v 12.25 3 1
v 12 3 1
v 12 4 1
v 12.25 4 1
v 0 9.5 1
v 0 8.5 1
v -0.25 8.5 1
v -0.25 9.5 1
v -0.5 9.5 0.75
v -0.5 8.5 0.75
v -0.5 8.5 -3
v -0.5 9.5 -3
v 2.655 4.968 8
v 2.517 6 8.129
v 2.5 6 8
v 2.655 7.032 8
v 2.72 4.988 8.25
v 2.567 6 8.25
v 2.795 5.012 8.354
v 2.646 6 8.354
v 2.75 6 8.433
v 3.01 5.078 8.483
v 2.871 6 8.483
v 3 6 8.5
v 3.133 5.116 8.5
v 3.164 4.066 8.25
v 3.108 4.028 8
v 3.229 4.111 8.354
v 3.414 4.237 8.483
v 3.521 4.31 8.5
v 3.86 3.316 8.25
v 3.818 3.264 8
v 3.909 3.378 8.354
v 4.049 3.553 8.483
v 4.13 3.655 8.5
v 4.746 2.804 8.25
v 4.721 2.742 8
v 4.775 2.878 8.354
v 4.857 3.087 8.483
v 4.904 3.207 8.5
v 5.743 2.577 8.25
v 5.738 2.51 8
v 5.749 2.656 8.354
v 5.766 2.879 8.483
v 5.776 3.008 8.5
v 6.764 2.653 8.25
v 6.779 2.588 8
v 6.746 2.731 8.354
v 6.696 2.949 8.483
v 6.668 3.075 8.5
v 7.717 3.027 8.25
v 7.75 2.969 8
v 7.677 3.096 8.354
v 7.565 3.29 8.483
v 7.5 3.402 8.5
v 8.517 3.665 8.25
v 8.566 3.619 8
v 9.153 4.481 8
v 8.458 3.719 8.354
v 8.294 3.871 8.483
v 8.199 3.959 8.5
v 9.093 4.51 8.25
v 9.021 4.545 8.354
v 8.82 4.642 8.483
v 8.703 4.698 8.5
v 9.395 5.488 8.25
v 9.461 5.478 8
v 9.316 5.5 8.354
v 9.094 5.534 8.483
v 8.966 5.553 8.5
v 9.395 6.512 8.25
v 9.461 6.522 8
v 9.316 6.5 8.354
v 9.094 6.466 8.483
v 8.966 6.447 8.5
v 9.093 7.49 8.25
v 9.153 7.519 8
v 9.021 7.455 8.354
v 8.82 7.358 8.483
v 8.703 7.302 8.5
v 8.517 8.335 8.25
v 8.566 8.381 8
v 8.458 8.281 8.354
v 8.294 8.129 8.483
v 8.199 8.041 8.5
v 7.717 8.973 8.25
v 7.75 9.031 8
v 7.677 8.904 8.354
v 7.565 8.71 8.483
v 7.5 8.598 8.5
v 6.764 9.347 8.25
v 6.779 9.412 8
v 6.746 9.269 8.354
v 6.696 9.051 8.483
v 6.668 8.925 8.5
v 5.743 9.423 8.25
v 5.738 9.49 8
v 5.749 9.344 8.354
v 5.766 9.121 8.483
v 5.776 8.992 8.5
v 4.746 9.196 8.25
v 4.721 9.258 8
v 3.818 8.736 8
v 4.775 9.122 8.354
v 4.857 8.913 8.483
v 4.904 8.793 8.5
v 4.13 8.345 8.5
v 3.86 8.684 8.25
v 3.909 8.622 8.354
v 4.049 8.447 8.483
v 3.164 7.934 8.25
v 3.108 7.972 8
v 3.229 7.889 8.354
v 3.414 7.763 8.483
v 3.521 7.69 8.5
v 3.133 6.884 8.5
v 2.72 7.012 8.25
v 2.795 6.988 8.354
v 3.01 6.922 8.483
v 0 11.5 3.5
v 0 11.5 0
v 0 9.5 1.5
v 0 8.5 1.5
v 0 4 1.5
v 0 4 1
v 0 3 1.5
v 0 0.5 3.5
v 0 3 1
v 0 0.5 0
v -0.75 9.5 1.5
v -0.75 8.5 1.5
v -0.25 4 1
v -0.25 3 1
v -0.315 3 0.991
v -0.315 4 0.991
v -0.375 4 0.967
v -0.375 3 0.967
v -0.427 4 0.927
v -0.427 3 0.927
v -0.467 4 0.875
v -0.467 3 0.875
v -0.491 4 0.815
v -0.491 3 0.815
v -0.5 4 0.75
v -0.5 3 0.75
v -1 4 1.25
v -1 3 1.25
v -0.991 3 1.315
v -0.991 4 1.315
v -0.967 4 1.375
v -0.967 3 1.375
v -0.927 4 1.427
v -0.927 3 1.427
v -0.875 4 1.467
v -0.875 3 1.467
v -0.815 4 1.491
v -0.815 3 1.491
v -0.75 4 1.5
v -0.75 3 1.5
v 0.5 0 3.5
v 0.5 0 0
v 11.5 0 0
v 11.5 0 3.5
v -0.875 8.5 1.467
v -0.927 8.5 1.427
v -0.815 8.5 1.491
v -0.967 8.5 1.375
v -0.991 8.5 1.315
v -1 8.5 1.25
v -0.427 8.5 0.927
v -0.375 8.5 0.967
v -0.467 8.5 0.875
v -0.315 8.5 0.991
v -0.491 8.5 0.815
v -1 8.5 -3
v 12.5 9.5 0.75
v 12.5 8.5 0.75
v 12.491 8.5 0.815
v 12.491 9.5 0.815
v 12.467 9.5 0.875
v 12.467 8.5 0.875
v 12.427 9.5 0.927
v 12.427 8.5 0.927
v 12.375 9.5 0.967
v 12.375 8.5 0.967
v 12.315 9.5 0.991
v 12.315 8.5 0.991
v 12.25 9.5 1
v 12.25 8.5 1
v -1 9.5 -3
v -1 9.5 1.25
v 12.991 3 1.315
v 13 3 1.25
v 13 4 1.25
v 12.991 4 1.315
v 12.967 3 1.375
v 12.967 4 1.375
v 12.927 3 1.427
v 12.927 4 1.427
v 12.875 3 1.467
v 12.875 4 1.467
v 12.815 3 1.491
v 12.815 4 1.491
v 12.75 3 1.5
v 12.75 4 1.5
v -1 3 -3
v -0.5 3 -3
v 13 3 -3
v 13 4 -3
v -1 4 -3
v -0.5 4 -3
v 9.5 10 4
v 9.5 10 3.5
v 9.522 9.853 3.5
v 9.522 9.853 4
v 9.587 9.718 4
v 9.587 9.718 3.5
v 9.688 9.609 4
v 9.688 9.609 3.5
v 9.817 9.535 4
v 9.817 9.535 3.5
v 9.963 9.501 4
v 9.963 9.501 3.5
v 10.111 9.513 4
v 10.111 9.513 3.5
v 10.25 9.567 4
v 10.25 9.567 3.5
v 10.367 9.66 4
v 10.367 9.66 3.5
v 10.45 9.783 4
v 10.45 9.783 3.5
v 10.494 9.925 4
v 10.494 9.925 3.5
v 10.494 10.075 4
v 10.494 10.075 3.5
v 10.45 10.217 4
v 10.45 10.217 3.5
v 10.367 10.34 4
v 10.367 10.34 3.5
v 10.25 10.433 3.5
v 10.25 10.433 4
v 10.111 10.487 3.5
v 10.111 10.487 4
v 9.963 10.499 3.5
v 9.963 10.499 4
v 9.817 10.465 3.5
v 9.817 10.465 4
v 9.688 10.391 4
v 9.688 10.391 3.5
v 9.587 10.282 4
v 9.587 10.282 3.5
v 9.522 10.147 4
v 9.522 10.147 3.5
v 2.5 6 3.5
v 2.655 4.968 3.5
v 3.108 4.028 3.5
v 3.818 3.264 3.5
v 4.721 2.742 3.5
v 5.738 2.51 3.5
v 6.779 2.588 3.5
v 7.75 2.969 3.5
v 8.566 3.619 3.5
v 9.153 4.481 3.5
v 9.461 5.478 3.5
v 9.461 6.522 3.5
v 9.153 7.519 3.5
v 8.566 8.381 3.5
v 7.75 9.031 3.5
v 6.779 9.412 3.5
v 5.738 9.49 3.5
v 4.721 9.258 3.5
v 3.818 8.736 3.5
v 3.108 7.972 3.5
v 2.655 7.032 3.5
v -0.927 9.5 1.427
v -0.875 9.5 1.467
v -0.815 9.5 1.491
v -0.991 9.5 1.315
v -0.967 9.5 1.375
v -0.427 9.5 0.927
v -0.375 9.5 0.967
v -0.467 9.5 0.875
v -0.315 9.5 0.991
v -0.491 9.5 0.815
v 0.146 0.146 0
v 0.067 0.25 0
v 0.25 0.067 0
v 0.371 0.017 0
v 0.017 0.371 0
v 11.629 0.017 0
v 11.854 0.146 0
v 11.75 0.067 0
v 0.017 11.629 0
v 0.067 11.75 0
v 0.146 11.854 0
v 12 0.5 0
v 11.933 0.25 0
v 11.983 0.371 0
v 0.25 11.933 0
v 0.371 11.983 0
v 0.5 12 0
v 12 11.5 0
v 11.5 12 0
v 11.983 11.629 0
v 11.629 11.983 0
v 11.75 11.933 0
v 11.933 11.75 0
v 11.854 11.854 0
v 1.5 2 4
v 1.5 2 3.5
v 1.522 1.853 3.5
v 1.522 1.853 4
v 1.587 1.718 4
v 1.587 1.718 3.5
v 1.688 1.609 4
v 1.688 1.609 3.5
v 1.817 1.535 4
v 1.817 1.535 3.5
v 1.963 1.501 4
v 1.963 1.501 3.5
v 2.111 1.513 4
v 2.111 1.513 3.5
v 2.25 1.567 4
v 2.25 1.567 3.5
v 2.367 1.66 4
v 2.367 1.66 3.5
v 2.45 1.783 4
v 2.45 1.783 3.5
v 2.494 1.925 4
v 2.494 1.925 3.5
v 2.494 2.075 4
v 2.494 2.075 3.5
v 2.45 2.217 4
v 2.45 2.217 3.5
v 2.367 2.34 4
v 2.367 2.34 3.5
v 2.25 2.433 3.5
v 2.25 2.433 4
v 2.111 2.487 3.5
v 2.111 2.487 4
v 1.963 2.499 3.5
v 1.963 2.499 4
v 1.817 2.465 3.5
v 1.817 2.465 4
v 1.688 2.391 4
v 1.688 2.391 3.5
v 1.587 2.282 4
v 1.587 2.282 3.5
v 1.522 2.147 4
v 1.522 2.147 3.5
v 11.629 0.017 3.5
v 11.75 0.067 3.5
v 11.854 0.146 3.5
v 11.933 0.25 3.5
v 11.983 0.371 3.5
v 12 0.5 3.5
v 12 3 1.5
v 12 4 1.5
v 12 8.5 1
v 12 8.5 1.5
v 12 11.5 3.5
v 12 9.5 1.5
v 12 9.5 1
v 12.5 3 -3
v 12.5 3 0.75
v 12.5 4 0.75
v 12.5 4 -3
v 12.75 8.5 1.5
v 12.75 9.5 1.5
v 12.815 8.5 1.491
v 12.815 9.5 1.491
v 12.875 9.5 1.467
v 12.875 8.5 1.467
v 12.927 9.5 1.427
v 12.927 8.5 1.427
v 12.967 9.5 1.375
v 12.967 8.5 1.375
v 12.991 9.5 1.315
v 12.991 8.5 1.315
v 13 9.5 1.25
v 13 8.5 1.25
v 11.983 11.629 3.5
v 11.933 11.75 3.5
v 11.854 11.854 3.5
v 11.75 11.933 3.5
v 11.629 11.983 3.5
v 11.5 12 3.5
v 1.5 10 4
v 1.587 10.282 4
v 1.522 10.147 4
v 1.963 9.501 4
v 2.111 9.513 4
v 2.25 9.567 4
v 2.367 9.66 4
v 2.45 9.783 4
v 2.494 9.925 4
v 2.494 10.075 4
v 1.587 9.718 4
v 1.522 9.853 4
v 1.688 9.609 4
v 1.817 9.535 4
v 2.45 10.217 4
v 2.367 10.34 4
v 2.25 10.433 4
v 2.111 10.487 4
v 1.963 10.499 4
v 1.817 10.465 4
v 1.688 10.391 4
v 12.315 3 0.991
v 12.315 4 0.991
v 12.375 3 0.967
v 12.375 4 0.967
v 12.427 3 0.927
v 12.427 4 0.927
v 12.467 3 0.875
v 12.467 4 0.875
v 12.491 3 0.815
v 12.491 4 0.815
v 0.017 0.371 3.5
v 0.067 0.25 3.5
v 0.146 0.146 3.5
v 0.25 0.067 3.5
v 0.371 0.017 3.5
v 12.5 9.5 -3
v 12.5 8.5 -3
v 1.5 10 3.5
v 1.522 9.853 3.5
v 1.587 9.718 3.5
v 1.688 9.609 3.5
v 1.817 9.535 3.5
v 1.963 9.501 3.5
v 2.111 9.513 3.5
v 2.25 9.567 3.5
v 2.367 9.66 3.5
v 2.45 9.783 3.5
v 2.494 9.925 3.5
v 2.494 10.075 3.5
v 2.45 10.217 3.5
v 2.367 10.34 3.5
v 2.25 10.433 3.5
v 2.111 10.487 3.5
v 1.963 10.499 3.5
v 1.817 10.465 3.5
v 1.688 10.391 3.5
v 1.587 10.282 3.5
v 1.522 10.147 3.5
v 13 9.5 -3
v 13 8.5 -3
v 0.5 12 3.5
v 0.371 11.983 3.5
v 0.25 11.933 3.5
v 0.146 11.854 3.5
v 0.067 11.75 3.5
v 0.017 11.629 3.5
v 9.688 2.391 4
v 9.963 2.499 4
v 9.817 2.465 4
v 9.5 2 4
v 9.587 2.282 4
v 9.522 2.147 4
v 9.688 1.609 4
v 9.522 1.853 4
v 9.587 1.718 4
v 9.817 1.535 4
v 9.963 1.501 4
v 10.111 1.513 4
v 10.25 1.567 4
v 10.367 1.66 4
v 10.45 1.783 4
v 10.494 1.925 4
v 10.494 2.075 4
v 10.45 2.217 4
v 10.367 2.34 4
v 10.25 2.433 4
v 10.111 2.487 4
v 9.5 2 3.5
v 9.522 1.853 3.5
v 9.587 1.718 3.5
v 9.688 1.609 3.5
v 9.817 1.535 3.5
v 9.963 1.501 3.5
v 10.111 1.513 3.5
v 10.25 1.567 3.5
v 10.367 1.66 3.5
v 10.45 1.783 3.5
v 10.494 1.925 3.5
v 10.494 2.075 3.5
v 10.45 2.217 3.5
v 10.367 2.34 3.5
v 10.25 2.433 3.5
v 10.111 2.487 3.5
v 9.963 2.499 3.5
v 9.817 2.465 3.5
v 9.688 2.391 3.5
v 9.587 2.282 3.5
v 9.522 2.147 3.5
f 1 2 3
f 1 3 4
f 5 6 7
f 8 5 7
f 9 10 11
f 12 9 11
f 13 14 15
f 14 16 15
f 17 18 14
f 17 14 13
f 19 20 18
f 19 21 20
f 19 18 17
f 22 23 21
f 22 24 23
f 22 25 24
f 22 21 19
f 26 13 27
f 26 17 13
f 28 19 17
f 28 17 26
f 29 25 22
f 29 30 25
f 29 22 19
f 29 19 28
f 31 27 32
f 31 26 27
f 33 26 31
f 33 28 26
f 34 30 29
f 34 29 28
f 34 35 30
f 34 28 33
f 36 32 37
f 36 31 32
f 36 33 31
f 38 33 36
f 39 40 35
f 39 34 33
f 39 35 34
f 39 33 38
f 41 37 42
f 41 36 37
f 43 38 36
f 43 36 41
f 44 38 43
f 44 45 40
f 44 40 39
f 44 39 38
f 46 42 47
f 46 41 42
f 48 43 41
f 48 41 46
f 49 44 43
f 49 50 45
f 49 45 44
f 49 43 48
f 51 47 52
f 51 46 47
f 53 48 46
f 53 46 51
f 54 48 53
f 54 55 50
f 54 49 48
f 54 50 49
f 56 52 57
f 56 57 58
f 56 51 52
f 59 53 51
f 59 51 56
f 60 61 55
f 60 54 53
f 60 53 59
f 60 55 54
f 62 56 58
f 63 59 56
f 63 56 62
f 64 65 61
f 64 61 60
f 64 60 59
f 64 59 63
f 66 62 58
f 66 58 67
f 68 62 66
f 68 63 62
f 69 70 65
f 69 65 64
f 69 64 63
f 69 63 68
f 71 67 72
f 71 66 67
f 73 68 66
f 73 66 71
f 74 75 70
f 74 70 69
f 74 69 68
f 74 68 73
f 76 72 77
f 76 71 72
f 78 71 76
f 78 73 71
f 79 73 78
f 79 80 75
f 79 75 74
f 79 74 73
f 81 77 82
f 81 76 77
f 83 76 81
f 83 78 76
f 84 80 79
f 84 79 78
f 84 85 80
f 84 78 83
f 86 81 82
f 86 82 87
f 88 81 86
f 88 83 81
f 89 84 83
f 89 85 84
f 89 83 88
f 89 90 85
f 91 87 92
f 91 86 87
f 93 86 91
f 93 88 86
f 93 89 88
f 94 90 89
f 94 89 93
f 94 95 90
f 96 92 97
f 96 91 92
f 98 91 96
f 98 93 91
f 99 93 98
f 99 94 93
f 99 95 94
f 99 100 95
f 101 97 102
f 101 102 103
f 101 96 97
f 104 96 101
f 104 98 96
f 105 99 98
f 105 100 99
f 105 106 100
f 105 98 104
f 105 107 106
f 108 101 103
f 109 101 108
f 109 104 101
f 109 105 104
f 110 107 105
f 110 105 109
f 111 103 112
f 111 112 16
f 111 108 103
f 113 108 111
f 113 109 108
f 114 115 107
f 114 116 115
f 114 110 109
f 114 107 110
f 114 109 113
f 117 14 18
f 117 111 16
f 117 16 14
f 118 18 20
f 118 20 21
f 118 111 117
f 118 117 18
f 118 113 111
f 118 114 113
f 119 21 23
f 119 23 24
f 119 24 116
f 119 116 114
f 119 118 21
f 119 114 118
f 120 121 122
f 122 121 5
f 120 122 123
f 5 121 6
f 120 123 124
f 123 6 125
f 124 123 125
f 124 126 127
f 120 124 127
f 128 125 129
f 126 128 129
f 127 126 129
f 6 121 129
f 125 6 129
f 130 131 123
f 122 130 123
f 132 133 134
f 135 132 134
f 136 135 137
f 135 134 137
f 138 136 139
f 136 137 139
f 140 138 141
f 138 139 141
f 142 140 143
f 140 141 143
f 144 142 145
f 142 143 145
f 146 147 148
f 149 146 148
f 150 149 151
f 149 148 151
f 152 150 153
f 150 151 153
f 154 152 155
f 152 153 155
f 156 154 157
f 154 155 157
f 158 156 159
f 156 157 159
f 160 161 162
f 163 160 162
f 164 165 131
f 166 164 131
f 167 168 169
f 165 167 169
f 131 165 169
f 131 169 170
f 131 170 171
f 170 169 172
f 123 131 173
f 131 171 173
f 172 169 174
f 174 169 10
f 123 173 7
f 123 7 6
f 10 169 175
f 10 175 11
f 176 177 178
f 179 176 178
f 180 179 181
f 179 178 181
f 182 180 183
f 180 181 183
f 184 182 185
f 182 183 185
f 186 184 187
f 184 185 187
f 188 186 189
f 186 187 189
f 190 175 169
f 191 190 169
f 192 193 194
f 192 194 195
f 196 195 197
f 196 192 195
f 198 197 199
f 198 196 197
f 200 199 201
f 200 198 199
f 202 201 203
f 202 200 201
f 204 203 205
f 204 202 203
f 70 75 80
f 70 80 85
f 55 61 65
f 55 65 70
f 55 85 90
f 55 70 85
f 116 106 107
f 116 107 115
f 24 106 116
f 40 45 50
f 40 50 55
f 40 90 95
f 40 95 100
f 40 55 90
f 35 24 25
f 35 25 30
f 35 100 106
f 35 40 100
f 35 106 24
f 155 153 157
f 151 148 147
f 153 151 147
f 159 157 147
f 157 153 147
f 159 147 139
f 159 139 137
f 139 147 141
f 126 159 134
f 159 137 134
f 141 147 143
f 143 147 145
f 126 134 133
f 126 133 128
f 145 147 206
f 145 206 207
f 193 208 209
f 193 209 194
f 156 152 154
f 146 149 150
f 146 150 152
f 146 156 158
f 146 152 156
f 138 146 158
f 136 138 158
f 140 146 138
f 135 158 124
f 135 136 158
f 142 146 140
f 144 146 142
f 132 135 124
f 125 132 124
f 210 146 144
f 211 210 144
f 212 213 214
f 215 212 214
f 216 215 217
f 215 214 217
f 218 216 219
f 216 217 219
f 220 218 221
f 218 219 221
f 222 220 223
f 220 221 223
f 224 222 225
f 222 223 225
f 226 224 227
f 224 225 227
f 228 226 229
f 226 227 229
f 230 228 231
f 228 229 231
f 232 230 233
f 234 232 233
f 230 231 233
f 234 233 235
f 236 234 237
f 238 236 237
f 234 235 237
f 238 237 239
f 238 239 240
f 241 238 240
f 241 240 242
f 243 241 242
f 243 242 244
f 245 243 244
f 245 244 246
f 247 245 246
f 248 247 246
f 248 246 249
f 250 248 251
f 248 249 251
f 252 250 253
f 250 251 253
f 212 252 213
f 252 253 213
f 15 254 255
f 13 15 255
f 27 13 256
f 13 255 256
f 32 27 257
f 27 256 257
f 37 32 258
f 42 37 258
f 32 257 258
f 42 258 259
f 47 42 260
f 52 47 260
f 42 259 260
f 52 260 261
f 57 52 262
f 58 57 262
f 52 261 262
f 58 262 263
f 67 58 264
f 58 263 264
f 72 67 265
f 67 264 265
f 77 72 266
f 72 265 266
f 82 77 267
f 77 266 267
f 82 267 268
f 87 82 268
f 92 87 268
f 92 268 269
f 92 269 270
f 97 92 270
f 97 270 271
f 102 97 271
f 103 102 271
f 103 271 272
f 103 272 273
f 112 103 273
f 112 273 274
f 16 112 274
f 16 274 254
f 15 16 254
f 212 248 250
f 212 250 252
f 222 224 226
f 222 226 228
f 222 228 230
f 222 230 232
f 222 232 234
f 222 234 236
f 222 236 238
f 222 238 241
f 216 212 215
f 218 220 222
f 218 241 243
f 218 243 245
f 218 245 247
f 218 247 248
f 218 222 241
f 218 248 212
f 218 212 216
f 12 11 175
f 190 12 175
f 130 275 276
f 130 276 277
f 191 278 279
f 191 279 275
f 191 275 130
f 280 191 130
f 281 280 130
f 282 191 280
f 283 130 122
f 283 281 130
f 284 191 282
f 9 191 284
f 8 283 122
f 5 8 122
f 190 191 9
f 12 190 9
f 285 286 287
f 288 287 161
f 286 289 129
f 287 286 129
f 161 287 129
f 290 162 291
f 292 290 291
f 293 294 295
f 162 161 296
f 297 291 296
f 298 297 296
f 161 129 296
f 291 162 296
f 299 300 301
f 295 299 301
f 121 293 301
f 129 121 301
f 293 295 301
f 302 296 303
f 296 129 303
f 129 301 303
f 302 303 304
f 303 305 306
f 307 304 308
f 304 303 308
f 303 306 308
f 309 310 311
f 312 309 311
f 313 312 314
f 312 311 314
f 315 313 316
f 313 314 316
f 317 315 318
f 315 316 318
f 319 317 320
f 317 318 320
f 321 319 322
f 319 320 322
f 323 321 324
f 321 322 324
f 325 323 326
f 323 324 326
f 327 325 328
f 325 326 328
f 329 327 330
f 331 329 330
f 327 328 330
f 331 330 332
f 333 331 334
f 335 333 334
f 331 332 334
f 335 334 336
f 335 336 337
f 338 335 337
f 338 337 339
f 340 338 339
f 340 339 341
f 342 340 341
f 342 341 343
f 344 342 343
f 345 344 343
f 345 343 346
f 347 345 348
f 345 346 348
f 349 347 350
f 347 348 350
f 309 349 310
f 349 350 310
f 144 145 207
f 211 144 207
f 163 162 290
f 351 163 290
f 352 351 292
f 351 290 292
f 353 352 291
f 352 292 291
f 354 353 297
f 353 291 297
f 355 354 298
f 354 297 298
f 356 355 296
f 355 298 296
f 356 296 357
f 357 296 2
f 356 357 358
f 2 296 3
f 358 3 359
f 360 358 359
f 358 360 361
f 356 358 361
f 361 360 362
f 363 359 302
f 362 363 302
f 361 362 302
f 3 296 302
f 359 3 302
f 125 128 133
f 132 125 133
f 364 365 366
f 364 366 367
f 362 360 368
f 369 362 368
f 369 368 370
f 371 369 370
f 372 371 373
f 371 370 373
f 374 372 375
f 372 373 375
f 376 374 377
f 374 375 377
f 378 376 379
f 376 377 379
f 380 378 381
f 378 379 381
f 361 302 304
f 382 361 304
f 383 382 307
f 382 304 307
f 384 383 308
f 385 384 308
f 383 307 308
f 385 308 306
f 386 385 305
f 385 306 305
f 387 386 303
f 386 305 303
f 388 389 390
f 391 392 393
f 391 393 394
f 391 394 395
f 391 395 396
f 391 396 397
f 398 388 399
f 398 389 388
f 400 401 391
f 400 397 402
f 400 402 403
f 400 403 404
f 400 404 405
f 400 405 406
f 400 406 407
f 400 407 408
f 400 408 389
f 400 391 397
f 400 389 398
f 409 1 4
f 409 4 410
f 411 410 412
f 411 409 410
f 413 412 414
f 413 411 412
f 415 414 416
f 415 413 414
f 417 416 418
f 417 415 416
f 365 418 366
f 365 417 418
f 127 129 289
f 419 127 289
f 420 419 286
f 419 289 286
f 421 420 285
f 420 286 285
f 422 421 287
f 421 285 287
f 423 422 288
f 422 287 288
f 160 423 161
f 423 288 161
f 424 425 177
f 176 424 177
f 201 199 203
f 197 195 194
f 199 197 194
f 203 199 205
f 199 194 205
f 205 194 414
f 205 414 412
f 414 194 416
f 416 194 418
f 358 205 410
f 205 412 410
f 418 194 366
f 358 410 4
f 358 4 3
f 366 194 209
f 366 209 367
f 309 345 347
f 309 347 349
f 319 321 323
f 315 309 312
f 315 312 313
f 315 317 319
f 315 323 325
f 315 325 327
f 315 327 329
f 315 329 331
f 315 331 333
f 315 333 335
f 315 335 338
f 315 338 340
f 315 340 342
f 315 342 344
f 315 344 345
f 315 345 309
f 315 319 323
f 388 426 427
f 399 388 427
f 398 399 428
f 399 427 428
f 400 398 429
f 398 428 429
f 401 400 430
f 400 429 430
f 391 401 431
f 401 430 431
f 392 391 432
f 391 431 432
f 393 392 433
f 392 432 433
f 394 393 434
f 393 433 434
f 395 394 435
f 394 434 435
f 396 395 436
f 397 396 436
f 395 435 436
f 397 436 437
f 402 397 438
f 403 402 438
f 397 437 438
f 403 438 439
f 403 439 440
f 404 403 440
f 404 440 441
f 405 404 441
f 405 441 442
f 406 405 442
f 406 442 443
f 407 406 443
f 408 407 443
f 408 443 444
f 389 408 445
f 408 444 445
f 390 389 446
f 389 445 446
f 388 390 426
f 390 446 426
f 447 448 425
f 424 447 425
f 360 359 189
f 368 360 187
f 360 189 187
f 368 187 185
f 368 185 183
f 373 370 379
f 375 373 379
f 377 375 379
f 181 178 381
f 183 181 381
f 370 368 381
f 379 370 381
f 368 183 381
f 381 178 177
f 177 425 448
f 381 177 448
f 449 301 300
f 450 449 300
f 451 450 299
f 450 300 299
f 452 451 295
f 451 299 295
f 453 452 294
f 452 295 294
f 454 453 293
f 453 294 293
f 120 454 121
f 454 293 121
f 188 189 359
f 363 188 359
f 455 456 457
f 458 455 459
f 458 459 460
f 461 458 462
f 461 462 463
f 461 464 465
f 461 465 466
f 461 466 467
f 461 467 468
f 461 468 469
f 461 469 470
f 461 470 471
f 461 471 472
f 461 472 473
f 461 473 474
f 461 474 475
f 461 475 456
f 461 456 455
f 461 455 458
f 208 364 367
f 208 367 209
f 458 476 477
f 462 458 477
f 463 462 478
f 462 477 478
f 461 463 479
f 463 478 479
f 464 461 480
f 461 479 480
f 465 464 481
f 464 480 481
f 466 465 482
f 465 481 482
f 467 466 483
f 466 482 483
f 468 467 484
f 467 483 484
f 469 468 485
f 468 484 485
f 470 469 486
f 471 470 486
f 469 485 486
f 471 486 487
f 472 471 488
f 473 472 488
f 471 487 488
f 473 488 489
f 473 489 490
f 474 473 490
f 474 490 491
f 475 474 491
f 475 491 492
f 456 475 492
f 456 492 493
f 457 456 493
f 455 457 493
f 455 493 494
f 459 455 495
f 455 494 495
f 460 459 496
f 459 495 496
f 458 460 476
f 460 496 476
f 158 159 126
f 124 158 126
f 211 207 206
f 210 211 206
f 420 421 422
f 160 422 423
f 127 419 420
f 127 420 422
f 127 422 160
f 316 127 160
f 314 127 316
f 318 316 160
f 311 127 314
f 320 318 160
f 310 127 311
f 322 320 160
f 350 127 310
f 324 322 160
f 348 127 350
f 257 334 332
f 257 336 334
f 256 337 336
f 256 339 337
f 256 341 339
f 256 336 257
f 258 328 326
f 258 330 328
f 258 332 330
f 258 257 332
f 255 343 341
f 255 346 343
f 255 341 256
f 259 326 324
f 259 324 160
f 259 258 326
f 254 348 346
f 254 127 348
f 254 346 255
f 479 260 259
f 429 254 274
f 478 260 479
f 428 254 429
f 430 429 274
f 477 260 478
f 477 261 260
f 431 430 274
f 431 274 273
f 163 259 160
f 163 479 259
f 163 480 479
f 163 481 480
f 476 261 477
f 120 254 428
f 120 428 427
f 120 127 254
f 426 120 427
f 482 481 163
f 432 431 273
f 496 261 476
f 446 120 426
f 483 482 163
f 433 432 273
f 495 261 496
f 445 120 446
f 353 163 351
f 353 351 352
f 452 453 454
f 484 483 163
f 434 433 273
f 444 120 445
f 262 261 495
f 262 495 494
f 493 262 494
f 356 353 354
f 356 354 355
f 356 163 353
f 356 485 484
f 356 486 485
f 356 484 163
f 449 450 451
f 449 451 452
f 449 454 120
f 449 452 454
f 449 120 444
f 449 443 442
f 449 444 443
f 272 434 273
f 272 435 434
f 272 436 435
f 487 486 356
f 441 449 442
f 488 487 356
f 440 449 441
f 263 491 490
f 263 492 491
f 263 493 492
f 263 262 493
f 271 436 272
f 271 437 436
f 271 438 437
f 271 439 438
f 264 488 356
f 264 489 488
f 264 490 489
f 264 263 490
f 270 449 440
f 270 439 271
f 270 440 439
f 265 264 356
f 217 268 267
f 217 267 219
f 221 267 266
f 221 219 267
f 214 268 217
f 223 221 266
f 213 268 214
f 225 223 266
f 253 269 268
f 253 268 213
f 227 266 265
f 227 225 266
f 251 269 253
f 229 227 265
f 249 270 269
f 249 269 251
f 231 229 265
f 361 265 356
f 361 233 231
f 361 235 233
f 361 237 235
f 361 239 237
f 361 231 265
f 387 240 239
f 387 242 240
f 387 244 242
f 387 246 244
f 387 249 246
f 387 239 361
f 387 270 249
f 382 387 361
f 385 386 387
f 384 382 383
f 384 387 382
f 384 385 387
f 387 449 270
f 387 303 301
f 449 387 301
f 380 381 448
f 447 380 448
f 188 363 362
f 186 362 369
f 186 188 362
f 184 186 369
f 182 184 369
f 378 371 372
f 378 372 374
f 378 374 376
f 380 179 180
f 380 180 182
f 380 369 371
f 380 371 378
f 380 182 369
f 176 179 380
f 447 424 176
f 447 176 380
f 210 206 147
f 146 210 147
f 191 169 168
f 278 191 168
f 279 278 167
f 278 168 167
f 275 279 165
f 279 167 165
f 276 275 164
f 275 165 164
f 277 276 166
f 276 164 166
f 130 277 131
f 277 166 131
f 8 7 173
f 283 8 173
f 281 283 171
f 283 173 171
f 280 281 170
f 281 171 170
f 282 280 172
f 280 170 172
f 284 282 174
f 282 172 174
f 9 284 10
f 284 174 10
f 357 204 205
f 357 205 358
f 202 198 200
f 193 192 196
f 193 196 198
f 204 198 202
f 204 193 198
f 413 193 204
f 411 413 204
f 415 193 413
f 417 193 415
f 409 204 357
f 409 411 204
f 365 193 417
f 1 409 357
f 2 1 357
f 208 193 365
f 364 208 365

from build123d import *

# Parameters (mm, degrees)
Y_KSEKLIK_EKSTR_ZYON1_DEPTH = 3.5
IZIM2_R                     = 3.5
IZIM2_R_2                   = 0.5
Y_KSEKLIK_EKSTR_ZYON2_DEPTH = 0.5
IZIM3_R                     = 3.5
Y_KSEKLIK_EKSTR_ZYON3_DEPTH = 4.5
Y_KSEKLIK_EKSTR_ZYON4_DEPTH = 1
Y_KSEKLIK_EKSTR_ZYON5_DEPTH = 1
RADYUS1_R                   = 0.5


with BuildPart() as part:
    # Çizim1 → Yükseklik-Ekstrüzyon1 (new body)
    with BuildSketch(Plane.XY):
        with BuildLine():
            Line((0.5, 0), (11.5, 0))
            ThreePointArc((11.5, 0), (11.853553391, 0.146446609), (12, 0.5))
            Line((12, 0.5), (12, 11.5))
            ThreePointArc((12, 11.5), (11.853553391, 11.853553391), (11.5, 12))
            Line((11.5, 12), (0.5, 12))
            ThreePointArc((0.5, 12), (0.146446609, 11.853553391), (0, 11.5))
            Line((0, 11.5), (0, 0.5))
            ThreePointArc((0, 0.5), (0.146446609, 0.146446609), (0.5, 0))
        make_face()
    extrude(amount=Y_KSEKLIK_EKSTR_ZYON1_DEPTH)

    # Çizim2 → Yükseklik-Ekstrüzyon2 (add)
    with BuildSketch(Plane.XY.offset(3.5)):
        with Locations(Location((6, 6, 0), (0, 0, 180))):
            Circle(IZIM2_R)
        with Locations(Location((10, 10, 0), (0, 0, 180))):
            Circle(IZIM2_R_2)
        with Locations(Location((2, 10, 0), (0, 0, 180))):
            Circle(IZIM2_R_2)
        with Locations(Location((2, 2, 0), (0, 0, 180))):
            Circle(IZIM2_R_2)
        with Locations(Location((10, 2, 0), (0, 0, 180))):
            Circle(IZIM2_R_2)
    extrude(amount=Y_KSEKLIK_EKSTR_ZYON2_DEPTH)

    # Çizim3 → Yükseklik-Ekstrüzyon3 (add)
    with BuildSketch(Plane.XY.offset(4)):
        with Locations(Location((6, 6, 0), (0, 0, 180))):
            Circle(IZIM3_R)
    extrude(amount=Y_KSEKLIK_EKSTR_ZYON3_DEPTH)

    # Çizim4 → Yükseklik-Ekstrüzyon4 (add)
    with BuildSketch(Plane(origin=(0, 3, 0), x_dir=(-1, 0, 0), z_dir=(0, -1, 0))):
        with BuildLine():
            Line((0, -1), (0.25, -1))
            ThreePointArc((0.25, -1), (0.426776695, -0.926776695), (0.5, -0.75))
            Line((0.5, -0.75), (0.5, 3))
            Line((0.5, 3), (1, 3))
            Line((1, 3), (1, -1.25))
            ThreePointArc((1, -1.25), (0.926776695, -1.426776695), (0.75, -1.5))
            Line((0.75, -1.5), (0, -1.5))
            Line((0, -1.5), (0, -1))
        make_face()
        with BuildLine():
            Line((-12, -1.5), (-12, -1))
            Line((-12, -1), (-12.25, -1))
            ThreePointArc((-12.25, -1), (-12.426776695, -0.926776695), (-12.5, -0.75))
            Line((-12.5, -0.75), (-12.5, 3))
            Line((-12.5, 3), (-13, 3))
            Line((-13, 3), (-13, -1.25))
            ThreePointArc((-13, -1.25), (-12.926776695, -1.426776695), (-12.75, -1.5))
            Line((-12.75, -1.5), (-12, -1.5))
        make_face()
    extrude(amount=-Y_KSEKLIK_EKSTR_ZYON4_DEPTH)

    # Çizim6 → Yükseklik-Ekstrüzyon5 (add)
    with BuildSketch(Plane(origin=(0, 8.5, 0), x_dir=(1, 0, 0), z_dir=(0, 1, 0))):
        with BuildLine():
            Line((13, -1.25), (13, 3))
            Line((13, 3), (12.5, 3))
            Line((12.5, 3), (12.5, -0.75))
            ThreePointArc((12.5, -0.75), (12.426776695, -0.926776695), (12.25, -1))
            Line((12.25, -1), (12, -1))
            Line((12, -1), (12, -1.5))
            Line((12, -1.5), (12.75, -1.5))
            ThreePointArc((12.75, -1.5), (12.926776695, -1.426776695), (13, -1.25))
        make_face()
        with BuildLine():
            Line((0, -1.5), (0, -1))
            Line((0, -1), (-0.25, -1))
            ThreePointArc((-0.25, -1), (-0.426776695, -0.926776695), (-0.5, -0.75))
            Line((-0.5, -0.75), (-0.5, 3))
            Line((-0.5, 3), (-1, 3))
            Line((-1, 3), (-1, -1.25))
            ThreePointArc((-1, -1.25), (-0.926776695, -1.426776695), (-0.75, -1.5))
            Line((-0.75, -1.5), (0, -1.5))
        make_face()
    extrude(amount=Y_KSEKLIK_EKSTR_ZYON5_DEPTH)

    # Radyus1
    radyus1_edges = [part.edges().sort_by_distance(p)[0] for p in [
        (9.5, 6, 8.5),
    ]]
    fillet(radyus1_edges, radius=RADYUS1_R)


solid = part.part
